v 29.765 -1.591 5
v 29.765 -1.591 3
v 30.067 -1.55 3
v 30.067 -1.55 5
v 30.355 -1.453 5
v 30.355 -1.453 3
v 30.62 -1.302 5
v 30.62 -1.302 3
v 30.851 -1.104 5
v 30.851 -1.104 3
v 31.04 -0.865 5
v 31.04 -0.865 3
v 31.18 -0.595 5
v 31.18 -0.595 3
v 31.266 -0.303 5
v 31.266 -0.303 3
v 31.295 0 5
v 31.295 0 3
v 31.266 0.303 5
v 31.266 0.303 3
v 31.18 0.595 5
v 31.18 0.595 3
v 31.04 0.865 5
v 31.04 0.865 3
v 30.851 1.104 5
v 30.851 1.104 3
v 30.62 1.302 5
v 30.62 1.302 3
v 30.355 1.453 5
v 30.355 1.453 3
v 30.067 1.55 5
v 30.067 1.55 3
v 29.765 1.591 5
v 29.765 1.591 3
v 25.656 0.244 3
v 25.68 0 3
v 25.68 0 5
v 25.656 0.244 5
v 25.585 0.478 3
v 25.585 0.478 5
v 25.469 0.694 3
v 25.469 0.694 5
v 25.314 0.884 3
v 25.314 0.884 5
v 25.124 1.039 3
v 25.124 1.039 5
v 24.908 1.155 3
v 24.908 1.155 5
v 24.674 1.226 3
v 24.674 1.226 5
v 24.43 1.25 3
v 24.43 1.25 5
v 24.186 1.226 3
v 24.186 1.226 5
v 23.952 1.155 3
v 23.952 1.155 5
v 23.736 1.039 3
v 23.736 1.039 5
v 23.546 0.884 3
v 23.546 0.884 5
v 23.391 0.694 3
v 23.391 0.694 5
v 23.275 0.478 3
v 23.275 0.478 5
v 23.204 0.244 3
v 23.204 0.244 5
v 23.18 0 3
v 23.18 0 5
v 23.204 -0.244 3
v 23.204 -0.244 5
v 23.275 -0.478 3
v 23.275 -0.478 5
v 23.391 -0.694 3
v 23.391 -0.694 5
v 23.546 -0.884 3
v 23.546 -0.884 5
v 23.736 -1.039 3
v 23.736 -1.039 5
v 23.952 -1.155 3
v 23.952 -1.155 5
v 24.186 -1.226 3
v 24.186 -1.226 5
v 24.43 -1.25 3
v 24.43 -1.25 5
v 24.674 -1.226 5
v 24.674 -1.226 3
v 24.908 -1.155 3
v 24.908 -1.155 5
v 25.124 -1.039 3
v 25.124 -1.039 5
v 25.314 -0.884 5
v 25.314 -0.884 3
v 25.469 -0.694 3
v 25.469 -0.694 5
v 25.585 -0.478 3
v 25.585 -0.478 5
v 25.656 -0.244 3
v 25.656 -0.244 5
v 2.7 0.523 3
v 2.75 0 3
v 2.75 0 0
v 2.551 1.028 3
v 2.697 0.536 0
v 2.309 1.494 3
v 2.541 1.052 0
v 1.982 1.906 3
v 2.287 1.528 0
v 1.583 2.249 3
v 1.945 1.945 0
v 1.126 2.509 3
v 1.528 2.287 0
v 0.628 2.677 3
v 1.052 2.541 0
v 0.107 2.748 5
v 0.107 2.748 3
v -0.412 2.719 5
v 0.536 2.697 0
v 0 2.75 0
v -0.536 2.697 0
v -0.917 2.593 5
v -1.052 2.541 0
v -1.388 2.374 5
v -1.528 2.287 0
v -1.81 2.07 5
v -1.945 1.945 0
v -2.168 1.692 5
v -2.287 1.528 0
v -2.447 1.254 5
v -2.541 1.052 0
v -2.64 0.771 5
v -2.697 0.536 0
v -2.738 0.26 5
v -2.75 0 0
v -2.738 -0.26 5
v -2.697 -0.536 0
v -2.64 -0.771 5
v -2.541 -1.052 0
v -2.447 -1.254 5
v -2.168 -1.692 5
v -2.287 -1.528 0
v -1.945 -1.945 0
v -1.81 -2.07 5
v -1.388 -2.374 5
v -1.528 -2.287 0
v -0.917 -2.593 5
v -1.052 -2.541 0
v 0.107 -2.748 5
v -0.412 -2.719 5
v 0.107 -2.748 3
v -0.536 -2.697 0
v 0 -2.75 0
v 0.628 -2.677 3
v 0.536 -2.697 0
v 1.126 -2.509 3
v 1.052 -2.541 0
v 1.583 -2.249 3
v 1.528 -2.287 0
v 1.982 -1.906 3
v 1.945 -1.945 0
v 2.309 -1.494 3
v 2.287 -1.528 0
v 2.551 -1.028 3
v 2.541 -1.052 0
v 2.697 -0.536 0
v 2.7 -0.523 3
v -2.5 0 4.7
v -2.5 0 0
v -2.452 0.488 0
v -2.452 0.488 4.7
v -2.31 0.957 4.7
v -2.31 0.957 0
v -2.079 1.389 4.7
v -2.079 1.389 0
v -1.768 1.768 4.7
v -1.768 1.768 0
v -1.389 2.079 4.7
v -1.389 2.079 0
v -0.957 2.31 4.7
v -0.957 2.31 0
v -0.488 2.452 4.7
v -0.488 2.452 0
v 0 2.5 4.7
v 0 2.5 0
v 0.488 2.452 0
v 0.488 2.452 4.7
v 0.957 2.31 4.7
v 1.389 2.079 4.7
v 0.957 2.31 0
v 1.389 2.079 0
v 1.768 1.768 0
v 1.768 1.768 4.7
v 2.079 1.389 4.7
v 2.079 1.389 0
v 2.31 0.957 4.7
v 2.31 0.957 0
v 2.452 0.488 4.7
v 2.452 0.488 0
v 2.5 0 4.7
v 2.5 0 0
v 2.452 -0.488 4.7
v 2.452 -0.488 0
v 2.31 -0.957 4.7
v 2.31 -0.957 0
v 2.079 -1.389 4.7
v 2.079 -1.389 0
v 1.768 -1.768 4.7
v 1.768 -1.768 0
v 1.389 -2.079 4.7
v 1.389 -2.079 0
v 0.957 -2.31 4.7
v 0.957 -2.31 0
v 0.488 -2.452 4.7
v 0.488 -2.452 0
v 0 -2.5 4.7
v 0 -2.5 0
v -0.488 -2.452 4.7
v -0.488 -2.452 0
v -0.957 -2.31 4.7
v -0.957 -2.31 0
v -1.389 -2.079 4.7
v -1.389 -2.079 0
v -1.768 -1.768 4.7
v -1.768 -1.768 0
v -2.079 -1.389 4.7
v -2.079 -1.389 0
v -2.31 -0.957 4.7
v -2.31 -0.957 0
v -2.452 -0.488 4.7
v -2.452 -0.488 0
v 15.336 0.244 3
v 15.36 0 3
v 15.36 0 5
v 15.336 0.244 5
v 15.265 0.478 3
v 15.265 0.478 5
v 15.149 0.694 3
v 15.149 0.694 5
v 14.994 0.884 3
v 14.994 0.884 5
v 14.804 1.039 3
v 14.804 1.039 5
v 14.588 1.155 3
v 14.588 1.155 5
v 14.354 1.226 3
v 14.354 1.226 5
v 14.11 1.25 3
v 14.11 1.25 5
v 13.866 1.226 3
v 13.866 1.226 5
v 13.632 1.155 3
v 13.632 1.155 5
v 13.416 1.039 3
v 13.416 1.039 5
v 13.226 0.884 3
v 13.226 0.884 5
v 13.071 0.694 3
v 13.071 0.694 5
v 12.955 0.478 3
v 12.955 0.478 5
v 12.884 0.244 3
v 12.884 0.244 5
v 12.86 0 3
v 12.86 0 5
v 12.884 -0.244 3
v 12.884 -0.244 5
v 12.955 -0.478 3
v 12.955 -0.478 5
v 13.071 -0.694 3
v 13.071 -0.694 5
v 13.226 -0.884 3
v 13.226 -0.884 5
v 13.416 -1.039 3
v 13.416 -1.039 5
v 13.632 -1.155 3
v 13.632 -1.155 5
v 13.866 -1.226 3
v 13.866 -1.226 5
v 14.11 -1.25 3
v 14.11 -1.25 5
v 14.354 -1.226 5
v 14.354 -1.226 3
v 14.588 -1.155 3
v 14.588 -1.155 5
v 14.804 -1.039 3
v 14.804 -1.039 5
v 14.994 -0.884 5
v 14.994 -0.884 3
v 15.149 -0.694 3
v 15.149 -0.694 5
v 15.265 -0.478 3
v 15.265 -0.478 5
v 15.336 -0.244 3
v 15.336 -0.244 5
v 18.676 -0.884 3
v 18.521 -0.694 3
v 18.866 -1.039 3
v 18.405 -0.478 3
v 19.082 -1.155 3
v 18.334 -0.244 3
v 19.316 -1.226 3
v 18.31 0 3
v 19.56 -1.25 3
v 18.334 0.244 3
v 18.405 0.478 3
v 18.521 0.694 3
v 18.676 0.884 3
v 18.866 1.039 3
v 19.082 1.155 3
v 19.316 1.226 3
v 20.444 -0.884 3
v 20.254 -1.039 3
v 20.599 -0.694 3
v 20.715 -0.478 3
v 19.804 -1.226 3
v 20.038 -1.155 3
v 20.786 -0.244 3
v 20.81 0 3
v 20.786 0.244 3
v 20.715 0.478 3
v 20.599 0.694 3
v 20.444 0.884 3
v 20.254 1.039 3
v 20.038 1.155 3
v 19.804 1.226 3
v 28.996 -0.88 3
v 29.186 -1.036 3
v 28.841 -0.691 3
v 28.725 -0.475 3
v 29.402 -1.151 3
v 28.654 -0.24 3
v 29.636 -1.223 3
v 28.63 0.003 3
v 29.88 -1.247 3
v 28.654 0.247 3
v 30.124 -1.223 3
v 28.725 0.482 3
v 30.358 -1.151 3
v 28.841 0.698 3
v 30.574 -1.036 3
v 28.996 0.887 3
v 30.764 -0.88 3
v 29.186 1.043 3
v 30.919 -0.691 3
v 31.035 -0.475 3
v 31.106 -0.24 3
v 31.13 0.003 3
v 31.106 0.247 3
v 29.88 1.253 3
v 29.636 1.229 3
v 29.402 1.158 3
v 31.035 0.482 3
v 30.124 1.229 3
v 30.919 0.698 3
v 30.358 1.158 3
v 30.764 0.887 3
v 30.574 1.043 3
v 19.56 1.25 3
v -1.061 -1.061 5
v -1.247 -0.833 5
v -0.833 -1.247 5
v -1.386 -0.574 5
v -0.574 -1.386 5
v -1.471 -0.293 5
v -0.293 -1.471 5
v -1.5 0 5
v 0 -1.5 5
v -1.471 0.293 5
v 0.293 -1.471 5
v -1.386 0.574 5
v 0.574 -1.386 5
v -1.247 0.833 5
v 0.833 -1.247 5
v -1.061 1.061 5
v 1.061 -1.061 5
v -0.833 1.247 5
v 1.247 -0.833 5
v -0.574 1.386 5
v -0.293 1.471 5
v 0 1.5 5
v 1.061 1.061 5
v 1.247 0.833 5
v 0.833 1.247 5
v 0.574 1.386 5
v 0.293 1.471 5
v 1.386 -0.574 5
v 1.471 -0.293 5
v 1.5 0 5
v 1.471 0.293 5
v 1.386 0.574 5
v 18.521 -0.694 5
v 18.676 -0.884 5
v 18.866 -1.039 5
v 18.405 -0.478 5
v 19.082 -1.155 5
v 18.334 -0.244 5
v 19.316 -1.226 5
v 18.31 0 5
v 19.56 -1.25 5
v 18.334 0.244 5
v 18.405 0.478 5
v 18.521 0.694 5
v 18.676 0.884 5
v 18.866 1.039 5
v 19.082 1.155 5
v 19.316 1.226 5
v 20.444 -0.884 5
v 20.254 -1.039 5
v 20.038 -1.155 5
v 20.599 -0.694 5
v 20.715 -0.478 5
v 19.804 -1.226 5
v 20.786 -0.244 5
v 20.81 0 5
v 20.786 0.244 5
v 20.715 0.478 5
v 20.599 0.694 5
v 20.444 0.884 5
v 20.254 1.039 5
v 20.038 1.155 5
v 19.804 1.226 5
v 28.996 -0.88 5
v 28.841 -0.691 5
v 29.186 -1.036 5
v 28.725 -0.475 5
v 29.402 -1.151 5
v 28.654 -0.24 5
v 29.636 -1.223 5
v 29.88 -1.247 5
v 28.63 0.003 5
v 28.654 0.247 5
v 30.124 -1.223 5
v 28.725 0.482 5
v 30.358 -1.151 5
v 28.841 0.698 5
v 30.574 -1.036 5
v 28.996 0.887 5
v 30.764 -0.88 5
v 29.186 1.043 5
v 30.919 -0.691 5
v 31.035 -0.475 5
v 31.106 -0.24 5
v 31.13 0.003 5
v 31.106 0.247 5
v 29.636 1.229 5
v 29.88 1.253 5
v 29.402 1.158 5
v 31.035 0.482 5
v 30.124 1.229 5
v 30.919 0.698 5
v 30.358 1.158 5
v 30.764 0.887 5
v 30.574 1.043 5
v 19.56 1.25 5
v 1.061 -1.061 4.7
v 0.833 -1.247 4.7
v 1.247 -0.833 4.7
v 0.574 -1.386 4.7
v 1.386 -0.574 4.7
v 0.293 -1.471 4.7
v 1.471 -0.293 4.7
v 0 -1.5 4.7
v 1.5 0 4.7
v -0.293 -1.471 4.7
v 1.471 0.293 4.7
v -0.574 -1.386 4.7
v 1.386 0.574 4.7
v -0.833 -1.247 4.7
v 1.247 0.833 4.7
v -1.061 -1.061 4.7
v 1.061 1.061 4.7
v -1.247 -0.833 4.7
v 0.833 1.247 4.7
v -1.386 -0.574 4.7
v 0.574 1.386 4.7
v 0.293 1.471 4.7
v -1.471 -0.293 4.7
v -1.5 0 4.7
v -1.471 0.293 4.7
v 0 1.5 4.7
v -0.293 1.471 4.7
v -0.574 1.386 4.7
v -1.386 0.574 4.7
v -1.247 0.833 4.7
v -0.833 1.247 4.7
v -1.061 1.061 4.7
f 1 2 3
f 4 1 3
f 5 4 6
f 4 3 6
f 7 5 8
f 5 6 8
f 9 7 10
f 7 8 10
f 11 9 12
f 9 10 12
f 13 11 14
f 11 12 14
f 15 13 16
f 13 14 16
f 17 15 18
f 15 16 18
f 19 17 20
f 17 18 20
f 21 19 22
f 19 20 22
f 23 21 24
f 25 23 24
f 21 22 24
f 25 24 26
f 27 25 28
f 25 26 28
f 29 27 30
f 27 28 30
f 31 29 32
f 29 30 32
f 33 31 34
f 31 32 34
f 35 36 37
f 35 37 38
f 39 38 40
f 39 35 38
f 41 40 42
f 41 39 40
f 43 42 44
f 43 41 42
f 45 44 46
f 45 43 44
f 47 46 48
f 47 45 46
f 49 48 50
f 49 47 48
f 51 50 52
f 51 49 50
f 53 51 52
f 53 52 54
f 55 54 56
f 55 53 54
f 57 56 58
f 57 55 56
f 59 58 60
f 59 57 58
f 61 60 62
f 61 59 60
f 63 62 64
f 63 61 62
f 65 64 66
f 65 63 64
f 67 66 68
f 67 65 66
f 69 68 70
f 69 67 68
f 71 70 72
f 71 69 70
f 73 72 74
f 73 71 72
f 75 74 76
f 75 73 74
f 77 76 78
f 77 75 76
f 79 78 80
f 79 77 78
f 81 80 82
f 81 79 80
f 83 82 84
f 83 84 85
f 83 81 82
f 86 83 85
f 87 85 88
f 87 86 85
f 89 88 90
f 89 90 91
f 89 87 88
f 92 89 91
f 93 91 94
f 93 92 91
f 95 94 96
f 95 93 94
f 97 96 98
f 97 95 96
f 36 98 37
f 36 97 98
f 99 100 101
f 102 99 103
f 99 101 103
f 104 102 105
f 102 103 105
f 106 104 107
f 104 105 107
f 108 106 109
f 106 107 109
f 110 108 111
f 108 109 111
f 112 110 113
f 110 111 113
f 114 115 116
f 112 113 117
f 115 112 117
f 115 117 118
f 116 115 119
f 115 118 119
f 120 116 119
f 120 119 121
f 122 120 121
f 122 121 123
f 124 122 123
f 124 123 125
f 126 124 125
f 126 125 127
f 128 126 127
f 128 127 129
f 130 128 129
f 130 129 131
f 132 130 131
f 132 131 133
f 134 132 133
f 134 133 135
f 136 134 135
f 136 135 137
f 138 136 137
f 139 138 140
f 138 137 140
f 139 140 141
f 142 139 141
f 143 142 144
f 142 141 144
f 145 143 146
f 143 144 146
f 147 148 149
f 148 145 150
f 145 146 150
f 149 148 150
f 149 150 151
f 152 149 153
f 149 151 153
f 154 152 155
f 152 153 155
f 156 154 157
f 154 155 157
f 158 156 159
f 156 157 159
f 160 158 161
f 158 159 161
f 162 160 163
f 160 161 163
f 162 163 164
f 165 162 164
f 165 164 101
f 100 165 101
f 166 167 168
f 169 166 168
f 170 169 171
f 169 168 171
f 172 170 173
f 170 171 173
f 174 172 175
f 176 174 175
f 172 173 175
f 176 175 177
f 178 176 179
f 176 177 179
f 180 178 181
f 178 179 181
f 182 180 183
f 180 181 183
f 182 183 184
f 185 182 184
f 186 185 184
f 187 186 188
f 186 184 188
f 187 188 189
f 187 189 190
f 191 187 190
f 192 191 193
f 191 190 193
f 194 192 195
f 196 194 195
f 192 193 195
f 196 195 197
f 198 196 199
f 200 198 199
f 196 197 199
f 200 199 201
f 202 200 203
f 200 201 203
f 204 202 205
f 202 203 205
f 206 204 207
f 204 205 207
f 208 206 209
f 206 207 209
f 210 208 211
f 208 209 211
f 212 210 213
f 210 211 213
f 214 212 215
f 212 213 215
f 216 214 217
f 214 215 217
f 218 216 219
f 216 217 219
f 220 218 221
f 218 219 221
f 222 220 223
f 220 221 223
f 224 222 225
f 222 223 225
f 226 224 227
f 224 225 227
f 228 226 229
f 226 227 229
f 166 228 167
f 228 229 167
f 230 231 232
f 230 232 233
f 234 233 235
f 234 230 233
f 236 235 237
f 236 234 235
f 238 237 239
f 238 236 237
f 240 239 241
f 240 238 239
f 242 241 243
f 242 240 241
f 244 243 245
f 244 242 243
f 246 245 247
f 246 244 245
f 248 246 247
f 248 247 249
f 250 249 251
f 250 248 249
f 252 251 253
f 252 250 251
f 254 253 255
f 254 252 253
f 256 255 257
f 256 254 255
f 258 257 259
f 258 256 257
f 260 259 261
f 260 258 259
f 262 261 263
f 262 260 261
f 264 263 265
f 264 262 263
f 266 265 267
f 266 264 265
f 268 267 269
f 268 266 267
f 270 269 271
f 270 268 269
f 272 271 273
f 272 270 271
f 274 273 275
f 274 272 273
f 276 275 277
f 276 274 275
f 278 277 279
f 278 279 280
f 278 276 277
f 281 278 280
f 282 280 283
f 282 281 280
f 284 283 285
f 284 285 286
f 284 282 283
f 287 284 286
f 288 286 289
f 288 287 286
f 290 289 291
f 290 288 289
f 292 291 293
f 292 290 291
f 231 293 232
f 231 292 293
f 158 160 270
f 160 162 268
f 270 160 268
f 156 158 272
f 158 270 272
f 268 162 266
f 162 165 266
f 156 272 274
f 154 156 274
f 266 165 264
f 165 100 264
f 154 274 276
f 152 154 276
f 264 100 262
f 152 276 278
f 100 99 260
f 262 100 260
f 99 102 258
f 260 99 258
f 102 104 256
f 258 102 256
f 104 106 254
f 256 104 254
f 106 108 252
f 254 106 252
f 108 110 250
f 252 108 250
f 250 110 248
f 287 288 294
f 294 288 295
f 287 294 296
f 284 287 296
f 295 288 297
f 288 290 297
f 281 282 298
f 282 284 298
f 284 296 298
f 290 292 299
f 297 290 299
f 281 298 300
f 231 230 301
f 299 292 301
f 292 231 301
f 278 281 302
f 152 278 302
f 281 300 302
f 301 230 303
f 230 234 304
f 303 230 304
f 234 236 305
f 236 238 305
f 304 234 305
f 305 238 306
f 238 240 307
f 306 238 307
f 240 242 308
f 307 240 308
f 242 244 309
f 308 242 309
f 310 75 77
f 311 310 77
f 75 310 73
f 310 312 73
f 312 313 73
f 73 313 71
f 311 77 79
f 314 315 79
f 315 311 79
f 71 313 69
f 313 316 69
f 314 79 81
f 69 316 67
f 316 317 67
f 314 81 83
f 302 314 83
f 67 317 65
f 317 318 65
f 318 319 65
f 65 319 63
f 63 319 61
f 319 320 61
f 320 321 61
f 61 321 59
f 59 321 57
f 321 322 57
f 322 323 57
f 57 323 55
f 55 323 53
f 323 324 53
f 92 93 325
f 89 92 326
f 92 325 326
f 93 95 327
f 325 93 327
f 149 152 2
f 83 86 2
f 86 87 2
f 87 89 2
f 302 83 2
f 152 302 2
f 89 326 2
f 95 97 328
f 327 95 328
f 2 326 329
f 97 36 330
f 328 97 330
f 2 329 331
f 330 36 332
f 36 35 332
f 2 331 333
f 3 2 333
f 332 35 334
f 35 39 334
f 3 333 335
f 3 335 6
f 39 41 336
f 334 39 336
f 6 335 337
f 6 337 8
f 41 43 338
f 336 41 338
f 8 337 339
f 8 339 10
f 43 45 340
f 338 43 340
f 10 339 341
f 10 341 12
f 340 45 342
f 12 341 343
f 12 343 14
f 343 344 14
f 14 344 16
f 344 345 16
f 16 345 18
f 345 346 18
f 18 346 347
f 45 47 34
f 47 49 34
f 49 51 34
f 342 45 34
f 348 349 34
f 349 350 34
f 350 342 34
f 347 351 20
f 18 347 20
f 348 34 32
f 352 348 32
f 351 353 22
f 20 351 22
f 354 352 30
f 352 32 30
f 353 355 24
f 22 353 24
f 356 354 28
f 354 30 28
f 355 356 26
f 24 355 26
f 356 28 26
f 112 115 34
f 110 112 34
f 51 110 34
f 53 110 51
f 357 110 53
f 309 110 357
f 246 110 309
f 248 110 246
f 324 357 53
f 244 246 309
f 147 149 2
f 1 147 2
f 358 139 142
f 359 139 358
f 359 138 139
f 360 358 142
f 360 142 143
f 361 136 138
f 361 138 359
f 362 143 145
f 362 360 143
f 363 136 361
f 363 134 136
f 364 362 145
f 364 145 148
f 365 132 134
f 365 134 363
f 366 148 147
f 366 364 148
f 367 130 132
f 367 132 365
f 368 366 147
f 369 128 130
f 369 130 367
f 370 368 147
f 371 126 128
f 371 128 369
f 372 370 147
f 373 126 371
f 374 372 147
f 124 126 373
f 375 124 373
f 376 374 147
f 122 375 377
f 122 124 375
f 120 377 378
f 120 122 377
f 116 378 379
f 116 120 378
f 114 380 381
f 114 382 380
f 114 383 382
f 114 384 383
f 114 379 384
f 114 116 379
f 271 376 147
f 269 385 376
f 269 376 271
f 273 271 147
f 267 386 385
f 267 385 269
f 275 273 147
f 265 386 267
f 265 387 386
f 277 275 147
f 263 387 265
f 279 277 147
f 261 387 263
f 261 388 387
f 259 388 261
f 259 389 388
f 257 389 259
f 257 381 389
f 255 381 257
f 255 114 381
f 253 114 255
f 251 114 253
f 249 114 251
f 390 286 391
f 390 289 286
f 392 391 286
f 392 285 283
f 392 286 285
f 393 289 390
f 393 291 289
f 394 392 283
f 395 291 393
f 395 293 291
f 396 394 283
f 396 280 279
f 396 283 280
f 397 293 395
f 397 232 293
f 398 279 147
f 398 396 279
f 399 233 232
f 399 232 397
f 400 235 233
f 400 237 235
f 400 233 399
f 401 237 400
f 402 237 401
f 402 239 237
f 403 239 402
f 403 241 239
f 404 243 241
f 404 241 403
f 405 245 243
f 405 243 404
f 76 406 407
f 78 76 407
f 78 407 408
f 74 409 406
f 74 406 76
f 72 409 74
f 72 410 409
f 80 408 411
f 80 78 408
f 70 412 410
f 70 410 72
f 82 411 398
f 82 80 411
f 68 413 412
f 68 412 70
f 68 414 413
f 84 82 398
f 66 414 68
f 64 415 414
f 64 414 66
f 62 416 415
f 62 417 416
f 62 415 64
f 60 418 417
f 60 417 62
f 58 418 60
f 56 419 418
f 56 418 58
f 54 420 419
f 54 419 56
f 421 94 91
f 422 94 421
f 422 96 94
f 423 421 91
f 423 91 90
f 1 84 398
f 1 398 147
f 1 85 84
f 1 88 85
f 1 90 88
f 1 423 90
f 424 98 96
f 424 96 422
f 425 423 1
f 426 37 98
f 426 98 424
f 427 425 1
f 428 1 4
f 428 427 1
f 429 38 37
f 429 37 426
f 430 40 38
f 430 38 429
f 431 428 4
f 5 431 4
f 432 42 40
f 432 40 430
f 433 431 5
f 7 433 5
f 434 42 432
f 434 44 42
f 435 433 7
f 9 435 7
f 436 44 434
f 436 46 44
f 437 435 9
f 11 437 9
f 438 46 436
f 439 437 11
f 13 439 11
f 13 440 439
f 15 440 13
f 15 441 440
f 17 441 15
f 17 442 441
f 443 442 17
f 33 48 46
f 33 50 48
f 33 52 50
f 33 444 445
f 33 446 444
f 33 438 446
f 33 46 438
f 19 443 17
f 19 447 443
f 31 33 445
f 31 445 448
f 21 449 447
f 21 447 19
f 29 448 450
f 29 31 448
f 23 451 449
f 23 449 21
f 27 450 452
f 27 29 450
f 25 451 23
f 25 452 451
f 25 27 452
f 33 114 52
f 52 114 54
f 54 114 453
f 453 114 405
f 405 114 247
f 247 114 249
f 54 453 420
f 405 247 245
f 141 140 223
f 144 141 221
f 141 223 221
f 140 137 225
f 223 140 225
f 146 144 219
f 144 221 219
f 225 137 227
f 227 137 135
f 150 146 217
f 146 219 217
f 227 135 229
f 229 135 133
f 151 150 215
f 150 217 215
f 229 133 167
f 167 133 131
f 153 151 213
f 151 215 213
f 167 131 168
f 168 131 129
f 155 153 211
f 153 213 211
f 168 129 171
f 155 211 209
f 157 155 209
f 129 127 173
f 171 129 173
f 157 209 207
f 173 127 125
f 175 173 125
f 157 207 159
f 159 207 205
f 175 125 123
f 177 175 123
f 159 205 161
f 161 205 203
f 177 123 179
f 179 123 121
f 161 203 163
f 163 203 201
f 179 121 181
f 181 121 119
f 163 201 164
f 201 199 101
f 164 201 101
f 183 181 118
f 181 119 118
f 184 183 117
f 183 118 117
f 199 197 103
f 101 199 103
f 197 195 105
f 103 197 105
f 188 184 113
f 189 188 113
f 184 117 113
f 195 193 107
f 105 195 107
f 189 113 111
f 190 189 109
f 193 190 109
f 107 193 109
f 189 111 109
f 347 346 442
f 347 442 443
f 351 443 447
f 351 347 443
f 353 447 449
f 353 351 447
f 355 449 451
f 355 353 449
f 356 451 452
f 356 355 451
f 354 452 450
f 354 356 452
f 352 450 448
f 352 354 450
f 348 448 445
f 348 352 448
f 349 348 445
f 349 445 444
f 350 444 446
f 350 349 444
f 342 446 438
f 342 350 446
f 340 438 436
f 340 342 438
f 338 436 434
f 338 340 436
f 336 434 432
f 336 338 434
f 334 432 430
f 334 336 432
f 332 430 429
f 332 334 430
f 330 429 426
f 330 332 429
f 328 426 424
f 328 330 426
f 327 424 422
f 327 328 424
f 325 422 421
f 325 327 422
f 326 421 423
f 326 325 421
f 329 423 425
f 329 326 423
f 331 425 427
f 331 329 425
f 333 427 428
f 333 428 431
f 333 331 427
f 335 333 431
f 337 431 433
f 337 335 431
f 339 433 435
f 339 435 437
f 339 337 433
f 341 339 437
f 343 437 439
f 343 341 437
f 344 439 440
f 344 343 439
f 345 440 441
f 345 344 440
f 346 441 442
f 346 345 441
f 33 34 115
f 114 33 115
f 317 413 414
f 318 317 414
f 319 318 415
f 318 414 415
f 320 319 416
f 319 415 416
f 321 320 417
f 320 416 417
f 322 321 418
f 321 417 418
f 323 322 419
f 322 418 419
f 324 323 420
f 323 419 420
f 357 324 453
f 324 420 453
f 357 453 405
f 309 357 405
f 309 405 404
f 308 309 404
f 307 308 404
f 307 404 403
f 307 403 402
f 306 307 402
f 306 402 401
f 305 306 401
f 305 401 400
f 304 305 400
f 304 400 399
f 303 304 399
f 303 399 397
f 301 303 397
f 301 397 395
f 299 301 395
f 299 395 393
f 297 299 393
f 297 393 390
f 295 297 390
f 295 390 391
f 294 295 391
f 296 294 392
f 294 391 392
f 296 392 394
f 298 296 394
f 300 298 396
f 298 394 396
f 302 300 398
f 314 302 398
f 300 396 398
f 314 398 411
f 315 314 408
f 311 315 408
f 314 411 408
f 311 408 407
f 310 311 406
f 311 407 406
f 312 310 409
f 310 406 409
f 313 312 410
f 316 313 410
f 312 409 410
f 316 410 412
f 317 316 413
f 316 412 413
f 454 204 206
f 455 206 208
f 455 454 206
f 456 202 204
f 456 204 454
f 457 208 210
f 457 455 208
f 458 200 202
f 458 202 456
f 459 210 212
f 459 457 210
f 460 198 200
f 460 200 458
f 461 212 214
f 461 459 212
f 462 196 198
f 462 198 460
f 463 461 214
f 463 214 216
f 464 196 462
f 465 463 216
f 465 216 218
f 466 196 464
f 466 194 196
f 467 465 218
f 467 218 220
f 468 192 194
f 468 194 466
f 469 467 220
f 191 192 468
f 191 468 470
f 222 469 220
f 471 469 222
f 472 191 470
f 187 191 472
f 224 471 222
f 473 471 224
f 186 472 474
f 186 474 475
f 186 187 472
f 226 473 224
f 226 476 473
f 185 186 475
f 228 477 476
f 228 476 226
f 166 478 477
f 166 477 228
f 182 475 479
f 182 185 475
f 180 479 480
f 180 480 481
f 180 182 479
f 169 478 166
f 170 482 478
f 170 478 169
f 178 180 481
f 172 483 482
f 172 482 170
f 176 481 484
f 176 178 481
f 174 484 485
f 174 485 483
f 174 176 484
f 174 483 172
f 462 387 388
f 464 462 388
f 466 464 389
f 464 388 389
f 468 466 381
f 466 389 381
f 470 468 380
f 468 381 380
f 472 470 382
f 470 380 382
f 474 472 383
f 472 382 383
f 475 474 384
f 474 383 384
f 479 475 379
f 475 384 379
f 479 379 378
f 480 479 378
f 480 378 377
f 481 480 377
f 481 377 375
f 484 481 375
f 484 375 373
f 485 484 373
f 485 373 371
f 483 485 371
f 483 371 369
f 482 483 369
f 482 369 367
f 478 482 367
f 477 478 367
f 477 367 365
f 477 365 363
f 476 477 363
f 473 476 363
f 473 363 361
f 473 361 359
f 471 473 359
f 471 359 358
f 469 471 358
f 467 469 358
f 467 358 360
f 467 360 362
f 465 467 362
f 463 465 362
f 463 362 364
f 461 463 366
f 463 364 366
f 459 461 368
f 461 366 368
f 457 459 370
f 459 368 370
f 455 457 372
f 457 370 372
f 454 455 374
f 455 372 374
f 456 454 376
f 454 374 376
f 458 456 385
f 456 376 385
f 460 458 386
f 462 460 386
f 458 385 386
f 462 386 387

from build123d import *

# Parameters (mm, degrees)
SKETCH_1_R          = 2.75
EXTRUDE_1_DEPTH     = 5
SKETCH_2_R          = 2.5
CUT_EXTRUDE_1_DEPTH = 4.7
SKETCH_3_R          = 1.5
CUT_EXTRUDE_2_DEPTH = 4.7
EXTRUDE_START       = -2
SKETCH_4_R          = 1.25
EXTRUDE_3_DEPTH     = 2
SKETCH_5_R          = 1.25
CUT_EXTRUDE_3_DEPTH = 10


with BuildPart() as part:
    # 草图1 → 凸台-拉伸1 (new body)
    with BuildSketch(Plane.XY):
        Circle(SKETCH_1_R)
    extrude(amount=EXTRUDE_1_DEPTH)

    # 草图2 → 切除-拉伸1 (cut)
    with BuildSketch(Plane(origin=(0, 0, 0), x_dir=(-1, 0, 0), z_dir=(0, 0, -1))):
        Circle(SKETCH_2_R)
    extrude(amount=-CUT_EXTRUDE_1_DEPTH, mode=Mode.SUBTRACT)

    # 草图3 → 切除-拉伸2 (cut)
    with BuildSketch(Plane.XY.offset(5)):
        Circle(SKETCH_3_R)
    extrude(amount=-CUT_EXTRUDE_2_DEPTH, mode=Mode.SUBTRACT)

    # 草图4 → 凸台-拉伸3 (add)
    with BuildSketch(Plane.XY.offset(5).offset(EXTRUDE_START)):
        with BuildLine():
            Line((29.765180985, 1.590978823), (0.10719348, 2.747910035))
            ThreePointArc((0.10719348, 2.747910035), (1.982079977, 1.906268335), (2.75, 0))
            ThreePointArc((2.75, 0), (1.982079977, -1.906268335), (0.10719348, -2.747910035))
            Line((0.10719348, -2.747910035), (29.765180985, -1.590978823))
            ThreePointArc((29.765180985, -1.590978823), (31.29530721, 0), (29.765180985, 1.590978823))
        make_face()
        with Locations((14.11, 0)):
            Circle(SKETCH_4_R, mode=Mode.SUBTRACT)
        with Locations((24.43, 0)):
            Circle(SKETCH_4_R, mode=Mode.SUBTRACT)
        with Locations((29.8799998, 0.003455751)):
            Circle(SKETCH_4_R, mode=Mode.SUBTRACT)
    extrude(amount=EXTRUDE_3_DEPTH)

    # 草图5 → 切除-拉伸3 (cut)
    with BuildSketch(Plane.XY.offset(5)):
        with Locations((19.56, 0)):
            Circle(SKETCH_5_R)
    extrude(amount=-CUT_EXTRUDE_3_DEPTH, mode=Mode.SUBTRACT)


solid = part.part
